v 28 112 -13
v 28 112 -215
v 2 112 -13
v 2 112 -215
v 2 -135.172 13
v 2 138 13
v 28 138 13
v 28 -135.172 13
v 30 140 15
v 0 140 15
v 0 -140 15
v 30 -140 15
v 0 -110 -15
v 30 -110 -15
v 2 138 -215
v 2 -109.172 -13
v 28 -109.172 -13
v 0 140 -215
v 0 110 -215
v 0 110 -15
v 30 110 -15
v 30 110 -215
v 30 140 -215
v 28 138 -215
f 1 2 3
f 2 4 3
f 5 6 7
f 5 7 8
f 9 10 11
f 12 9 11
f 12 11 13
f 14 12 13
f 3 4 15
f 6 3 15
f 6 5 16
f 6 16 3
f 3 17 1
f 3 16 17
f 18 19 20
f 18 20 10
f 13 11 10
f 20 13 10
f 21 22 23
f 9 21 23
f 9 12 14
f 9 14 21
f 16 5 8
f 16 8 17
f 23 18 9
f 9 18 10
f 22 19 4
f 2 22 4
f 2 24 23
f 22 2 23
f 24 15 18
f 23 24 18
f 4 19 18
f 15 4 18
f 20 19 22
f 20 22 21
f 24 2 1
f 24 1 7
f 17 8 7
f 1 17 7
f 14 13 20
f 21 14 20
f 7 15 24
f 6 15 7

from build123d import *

# Parameters (mm, degrees)
F0_W     = 30
F0_H     = 200
F1_DEPTH = 30
F2_T     = -2


with BuildPart() as f1:
    # F0 (on Right) → F1 (new body)
    with BuildSketch(Plane.YZ):
        with Locations((125, -115)):
            Rectangle(F0_W, F0_H)
        Polygon((110, -15), (140, -15), (140, 15), (-140, 15), (-110, -15), align=None)
    extrude(amount=F1_DEPTH)

    # F2
    f2_openings = [f1.faces().sort_by_distance(p)[0] for p in [
        (15, 125, -215),
    ]]
    offset(amount=F2_T, openings=f2_openings, kind=Kind.INTERSECTION)


solid = f1.part
